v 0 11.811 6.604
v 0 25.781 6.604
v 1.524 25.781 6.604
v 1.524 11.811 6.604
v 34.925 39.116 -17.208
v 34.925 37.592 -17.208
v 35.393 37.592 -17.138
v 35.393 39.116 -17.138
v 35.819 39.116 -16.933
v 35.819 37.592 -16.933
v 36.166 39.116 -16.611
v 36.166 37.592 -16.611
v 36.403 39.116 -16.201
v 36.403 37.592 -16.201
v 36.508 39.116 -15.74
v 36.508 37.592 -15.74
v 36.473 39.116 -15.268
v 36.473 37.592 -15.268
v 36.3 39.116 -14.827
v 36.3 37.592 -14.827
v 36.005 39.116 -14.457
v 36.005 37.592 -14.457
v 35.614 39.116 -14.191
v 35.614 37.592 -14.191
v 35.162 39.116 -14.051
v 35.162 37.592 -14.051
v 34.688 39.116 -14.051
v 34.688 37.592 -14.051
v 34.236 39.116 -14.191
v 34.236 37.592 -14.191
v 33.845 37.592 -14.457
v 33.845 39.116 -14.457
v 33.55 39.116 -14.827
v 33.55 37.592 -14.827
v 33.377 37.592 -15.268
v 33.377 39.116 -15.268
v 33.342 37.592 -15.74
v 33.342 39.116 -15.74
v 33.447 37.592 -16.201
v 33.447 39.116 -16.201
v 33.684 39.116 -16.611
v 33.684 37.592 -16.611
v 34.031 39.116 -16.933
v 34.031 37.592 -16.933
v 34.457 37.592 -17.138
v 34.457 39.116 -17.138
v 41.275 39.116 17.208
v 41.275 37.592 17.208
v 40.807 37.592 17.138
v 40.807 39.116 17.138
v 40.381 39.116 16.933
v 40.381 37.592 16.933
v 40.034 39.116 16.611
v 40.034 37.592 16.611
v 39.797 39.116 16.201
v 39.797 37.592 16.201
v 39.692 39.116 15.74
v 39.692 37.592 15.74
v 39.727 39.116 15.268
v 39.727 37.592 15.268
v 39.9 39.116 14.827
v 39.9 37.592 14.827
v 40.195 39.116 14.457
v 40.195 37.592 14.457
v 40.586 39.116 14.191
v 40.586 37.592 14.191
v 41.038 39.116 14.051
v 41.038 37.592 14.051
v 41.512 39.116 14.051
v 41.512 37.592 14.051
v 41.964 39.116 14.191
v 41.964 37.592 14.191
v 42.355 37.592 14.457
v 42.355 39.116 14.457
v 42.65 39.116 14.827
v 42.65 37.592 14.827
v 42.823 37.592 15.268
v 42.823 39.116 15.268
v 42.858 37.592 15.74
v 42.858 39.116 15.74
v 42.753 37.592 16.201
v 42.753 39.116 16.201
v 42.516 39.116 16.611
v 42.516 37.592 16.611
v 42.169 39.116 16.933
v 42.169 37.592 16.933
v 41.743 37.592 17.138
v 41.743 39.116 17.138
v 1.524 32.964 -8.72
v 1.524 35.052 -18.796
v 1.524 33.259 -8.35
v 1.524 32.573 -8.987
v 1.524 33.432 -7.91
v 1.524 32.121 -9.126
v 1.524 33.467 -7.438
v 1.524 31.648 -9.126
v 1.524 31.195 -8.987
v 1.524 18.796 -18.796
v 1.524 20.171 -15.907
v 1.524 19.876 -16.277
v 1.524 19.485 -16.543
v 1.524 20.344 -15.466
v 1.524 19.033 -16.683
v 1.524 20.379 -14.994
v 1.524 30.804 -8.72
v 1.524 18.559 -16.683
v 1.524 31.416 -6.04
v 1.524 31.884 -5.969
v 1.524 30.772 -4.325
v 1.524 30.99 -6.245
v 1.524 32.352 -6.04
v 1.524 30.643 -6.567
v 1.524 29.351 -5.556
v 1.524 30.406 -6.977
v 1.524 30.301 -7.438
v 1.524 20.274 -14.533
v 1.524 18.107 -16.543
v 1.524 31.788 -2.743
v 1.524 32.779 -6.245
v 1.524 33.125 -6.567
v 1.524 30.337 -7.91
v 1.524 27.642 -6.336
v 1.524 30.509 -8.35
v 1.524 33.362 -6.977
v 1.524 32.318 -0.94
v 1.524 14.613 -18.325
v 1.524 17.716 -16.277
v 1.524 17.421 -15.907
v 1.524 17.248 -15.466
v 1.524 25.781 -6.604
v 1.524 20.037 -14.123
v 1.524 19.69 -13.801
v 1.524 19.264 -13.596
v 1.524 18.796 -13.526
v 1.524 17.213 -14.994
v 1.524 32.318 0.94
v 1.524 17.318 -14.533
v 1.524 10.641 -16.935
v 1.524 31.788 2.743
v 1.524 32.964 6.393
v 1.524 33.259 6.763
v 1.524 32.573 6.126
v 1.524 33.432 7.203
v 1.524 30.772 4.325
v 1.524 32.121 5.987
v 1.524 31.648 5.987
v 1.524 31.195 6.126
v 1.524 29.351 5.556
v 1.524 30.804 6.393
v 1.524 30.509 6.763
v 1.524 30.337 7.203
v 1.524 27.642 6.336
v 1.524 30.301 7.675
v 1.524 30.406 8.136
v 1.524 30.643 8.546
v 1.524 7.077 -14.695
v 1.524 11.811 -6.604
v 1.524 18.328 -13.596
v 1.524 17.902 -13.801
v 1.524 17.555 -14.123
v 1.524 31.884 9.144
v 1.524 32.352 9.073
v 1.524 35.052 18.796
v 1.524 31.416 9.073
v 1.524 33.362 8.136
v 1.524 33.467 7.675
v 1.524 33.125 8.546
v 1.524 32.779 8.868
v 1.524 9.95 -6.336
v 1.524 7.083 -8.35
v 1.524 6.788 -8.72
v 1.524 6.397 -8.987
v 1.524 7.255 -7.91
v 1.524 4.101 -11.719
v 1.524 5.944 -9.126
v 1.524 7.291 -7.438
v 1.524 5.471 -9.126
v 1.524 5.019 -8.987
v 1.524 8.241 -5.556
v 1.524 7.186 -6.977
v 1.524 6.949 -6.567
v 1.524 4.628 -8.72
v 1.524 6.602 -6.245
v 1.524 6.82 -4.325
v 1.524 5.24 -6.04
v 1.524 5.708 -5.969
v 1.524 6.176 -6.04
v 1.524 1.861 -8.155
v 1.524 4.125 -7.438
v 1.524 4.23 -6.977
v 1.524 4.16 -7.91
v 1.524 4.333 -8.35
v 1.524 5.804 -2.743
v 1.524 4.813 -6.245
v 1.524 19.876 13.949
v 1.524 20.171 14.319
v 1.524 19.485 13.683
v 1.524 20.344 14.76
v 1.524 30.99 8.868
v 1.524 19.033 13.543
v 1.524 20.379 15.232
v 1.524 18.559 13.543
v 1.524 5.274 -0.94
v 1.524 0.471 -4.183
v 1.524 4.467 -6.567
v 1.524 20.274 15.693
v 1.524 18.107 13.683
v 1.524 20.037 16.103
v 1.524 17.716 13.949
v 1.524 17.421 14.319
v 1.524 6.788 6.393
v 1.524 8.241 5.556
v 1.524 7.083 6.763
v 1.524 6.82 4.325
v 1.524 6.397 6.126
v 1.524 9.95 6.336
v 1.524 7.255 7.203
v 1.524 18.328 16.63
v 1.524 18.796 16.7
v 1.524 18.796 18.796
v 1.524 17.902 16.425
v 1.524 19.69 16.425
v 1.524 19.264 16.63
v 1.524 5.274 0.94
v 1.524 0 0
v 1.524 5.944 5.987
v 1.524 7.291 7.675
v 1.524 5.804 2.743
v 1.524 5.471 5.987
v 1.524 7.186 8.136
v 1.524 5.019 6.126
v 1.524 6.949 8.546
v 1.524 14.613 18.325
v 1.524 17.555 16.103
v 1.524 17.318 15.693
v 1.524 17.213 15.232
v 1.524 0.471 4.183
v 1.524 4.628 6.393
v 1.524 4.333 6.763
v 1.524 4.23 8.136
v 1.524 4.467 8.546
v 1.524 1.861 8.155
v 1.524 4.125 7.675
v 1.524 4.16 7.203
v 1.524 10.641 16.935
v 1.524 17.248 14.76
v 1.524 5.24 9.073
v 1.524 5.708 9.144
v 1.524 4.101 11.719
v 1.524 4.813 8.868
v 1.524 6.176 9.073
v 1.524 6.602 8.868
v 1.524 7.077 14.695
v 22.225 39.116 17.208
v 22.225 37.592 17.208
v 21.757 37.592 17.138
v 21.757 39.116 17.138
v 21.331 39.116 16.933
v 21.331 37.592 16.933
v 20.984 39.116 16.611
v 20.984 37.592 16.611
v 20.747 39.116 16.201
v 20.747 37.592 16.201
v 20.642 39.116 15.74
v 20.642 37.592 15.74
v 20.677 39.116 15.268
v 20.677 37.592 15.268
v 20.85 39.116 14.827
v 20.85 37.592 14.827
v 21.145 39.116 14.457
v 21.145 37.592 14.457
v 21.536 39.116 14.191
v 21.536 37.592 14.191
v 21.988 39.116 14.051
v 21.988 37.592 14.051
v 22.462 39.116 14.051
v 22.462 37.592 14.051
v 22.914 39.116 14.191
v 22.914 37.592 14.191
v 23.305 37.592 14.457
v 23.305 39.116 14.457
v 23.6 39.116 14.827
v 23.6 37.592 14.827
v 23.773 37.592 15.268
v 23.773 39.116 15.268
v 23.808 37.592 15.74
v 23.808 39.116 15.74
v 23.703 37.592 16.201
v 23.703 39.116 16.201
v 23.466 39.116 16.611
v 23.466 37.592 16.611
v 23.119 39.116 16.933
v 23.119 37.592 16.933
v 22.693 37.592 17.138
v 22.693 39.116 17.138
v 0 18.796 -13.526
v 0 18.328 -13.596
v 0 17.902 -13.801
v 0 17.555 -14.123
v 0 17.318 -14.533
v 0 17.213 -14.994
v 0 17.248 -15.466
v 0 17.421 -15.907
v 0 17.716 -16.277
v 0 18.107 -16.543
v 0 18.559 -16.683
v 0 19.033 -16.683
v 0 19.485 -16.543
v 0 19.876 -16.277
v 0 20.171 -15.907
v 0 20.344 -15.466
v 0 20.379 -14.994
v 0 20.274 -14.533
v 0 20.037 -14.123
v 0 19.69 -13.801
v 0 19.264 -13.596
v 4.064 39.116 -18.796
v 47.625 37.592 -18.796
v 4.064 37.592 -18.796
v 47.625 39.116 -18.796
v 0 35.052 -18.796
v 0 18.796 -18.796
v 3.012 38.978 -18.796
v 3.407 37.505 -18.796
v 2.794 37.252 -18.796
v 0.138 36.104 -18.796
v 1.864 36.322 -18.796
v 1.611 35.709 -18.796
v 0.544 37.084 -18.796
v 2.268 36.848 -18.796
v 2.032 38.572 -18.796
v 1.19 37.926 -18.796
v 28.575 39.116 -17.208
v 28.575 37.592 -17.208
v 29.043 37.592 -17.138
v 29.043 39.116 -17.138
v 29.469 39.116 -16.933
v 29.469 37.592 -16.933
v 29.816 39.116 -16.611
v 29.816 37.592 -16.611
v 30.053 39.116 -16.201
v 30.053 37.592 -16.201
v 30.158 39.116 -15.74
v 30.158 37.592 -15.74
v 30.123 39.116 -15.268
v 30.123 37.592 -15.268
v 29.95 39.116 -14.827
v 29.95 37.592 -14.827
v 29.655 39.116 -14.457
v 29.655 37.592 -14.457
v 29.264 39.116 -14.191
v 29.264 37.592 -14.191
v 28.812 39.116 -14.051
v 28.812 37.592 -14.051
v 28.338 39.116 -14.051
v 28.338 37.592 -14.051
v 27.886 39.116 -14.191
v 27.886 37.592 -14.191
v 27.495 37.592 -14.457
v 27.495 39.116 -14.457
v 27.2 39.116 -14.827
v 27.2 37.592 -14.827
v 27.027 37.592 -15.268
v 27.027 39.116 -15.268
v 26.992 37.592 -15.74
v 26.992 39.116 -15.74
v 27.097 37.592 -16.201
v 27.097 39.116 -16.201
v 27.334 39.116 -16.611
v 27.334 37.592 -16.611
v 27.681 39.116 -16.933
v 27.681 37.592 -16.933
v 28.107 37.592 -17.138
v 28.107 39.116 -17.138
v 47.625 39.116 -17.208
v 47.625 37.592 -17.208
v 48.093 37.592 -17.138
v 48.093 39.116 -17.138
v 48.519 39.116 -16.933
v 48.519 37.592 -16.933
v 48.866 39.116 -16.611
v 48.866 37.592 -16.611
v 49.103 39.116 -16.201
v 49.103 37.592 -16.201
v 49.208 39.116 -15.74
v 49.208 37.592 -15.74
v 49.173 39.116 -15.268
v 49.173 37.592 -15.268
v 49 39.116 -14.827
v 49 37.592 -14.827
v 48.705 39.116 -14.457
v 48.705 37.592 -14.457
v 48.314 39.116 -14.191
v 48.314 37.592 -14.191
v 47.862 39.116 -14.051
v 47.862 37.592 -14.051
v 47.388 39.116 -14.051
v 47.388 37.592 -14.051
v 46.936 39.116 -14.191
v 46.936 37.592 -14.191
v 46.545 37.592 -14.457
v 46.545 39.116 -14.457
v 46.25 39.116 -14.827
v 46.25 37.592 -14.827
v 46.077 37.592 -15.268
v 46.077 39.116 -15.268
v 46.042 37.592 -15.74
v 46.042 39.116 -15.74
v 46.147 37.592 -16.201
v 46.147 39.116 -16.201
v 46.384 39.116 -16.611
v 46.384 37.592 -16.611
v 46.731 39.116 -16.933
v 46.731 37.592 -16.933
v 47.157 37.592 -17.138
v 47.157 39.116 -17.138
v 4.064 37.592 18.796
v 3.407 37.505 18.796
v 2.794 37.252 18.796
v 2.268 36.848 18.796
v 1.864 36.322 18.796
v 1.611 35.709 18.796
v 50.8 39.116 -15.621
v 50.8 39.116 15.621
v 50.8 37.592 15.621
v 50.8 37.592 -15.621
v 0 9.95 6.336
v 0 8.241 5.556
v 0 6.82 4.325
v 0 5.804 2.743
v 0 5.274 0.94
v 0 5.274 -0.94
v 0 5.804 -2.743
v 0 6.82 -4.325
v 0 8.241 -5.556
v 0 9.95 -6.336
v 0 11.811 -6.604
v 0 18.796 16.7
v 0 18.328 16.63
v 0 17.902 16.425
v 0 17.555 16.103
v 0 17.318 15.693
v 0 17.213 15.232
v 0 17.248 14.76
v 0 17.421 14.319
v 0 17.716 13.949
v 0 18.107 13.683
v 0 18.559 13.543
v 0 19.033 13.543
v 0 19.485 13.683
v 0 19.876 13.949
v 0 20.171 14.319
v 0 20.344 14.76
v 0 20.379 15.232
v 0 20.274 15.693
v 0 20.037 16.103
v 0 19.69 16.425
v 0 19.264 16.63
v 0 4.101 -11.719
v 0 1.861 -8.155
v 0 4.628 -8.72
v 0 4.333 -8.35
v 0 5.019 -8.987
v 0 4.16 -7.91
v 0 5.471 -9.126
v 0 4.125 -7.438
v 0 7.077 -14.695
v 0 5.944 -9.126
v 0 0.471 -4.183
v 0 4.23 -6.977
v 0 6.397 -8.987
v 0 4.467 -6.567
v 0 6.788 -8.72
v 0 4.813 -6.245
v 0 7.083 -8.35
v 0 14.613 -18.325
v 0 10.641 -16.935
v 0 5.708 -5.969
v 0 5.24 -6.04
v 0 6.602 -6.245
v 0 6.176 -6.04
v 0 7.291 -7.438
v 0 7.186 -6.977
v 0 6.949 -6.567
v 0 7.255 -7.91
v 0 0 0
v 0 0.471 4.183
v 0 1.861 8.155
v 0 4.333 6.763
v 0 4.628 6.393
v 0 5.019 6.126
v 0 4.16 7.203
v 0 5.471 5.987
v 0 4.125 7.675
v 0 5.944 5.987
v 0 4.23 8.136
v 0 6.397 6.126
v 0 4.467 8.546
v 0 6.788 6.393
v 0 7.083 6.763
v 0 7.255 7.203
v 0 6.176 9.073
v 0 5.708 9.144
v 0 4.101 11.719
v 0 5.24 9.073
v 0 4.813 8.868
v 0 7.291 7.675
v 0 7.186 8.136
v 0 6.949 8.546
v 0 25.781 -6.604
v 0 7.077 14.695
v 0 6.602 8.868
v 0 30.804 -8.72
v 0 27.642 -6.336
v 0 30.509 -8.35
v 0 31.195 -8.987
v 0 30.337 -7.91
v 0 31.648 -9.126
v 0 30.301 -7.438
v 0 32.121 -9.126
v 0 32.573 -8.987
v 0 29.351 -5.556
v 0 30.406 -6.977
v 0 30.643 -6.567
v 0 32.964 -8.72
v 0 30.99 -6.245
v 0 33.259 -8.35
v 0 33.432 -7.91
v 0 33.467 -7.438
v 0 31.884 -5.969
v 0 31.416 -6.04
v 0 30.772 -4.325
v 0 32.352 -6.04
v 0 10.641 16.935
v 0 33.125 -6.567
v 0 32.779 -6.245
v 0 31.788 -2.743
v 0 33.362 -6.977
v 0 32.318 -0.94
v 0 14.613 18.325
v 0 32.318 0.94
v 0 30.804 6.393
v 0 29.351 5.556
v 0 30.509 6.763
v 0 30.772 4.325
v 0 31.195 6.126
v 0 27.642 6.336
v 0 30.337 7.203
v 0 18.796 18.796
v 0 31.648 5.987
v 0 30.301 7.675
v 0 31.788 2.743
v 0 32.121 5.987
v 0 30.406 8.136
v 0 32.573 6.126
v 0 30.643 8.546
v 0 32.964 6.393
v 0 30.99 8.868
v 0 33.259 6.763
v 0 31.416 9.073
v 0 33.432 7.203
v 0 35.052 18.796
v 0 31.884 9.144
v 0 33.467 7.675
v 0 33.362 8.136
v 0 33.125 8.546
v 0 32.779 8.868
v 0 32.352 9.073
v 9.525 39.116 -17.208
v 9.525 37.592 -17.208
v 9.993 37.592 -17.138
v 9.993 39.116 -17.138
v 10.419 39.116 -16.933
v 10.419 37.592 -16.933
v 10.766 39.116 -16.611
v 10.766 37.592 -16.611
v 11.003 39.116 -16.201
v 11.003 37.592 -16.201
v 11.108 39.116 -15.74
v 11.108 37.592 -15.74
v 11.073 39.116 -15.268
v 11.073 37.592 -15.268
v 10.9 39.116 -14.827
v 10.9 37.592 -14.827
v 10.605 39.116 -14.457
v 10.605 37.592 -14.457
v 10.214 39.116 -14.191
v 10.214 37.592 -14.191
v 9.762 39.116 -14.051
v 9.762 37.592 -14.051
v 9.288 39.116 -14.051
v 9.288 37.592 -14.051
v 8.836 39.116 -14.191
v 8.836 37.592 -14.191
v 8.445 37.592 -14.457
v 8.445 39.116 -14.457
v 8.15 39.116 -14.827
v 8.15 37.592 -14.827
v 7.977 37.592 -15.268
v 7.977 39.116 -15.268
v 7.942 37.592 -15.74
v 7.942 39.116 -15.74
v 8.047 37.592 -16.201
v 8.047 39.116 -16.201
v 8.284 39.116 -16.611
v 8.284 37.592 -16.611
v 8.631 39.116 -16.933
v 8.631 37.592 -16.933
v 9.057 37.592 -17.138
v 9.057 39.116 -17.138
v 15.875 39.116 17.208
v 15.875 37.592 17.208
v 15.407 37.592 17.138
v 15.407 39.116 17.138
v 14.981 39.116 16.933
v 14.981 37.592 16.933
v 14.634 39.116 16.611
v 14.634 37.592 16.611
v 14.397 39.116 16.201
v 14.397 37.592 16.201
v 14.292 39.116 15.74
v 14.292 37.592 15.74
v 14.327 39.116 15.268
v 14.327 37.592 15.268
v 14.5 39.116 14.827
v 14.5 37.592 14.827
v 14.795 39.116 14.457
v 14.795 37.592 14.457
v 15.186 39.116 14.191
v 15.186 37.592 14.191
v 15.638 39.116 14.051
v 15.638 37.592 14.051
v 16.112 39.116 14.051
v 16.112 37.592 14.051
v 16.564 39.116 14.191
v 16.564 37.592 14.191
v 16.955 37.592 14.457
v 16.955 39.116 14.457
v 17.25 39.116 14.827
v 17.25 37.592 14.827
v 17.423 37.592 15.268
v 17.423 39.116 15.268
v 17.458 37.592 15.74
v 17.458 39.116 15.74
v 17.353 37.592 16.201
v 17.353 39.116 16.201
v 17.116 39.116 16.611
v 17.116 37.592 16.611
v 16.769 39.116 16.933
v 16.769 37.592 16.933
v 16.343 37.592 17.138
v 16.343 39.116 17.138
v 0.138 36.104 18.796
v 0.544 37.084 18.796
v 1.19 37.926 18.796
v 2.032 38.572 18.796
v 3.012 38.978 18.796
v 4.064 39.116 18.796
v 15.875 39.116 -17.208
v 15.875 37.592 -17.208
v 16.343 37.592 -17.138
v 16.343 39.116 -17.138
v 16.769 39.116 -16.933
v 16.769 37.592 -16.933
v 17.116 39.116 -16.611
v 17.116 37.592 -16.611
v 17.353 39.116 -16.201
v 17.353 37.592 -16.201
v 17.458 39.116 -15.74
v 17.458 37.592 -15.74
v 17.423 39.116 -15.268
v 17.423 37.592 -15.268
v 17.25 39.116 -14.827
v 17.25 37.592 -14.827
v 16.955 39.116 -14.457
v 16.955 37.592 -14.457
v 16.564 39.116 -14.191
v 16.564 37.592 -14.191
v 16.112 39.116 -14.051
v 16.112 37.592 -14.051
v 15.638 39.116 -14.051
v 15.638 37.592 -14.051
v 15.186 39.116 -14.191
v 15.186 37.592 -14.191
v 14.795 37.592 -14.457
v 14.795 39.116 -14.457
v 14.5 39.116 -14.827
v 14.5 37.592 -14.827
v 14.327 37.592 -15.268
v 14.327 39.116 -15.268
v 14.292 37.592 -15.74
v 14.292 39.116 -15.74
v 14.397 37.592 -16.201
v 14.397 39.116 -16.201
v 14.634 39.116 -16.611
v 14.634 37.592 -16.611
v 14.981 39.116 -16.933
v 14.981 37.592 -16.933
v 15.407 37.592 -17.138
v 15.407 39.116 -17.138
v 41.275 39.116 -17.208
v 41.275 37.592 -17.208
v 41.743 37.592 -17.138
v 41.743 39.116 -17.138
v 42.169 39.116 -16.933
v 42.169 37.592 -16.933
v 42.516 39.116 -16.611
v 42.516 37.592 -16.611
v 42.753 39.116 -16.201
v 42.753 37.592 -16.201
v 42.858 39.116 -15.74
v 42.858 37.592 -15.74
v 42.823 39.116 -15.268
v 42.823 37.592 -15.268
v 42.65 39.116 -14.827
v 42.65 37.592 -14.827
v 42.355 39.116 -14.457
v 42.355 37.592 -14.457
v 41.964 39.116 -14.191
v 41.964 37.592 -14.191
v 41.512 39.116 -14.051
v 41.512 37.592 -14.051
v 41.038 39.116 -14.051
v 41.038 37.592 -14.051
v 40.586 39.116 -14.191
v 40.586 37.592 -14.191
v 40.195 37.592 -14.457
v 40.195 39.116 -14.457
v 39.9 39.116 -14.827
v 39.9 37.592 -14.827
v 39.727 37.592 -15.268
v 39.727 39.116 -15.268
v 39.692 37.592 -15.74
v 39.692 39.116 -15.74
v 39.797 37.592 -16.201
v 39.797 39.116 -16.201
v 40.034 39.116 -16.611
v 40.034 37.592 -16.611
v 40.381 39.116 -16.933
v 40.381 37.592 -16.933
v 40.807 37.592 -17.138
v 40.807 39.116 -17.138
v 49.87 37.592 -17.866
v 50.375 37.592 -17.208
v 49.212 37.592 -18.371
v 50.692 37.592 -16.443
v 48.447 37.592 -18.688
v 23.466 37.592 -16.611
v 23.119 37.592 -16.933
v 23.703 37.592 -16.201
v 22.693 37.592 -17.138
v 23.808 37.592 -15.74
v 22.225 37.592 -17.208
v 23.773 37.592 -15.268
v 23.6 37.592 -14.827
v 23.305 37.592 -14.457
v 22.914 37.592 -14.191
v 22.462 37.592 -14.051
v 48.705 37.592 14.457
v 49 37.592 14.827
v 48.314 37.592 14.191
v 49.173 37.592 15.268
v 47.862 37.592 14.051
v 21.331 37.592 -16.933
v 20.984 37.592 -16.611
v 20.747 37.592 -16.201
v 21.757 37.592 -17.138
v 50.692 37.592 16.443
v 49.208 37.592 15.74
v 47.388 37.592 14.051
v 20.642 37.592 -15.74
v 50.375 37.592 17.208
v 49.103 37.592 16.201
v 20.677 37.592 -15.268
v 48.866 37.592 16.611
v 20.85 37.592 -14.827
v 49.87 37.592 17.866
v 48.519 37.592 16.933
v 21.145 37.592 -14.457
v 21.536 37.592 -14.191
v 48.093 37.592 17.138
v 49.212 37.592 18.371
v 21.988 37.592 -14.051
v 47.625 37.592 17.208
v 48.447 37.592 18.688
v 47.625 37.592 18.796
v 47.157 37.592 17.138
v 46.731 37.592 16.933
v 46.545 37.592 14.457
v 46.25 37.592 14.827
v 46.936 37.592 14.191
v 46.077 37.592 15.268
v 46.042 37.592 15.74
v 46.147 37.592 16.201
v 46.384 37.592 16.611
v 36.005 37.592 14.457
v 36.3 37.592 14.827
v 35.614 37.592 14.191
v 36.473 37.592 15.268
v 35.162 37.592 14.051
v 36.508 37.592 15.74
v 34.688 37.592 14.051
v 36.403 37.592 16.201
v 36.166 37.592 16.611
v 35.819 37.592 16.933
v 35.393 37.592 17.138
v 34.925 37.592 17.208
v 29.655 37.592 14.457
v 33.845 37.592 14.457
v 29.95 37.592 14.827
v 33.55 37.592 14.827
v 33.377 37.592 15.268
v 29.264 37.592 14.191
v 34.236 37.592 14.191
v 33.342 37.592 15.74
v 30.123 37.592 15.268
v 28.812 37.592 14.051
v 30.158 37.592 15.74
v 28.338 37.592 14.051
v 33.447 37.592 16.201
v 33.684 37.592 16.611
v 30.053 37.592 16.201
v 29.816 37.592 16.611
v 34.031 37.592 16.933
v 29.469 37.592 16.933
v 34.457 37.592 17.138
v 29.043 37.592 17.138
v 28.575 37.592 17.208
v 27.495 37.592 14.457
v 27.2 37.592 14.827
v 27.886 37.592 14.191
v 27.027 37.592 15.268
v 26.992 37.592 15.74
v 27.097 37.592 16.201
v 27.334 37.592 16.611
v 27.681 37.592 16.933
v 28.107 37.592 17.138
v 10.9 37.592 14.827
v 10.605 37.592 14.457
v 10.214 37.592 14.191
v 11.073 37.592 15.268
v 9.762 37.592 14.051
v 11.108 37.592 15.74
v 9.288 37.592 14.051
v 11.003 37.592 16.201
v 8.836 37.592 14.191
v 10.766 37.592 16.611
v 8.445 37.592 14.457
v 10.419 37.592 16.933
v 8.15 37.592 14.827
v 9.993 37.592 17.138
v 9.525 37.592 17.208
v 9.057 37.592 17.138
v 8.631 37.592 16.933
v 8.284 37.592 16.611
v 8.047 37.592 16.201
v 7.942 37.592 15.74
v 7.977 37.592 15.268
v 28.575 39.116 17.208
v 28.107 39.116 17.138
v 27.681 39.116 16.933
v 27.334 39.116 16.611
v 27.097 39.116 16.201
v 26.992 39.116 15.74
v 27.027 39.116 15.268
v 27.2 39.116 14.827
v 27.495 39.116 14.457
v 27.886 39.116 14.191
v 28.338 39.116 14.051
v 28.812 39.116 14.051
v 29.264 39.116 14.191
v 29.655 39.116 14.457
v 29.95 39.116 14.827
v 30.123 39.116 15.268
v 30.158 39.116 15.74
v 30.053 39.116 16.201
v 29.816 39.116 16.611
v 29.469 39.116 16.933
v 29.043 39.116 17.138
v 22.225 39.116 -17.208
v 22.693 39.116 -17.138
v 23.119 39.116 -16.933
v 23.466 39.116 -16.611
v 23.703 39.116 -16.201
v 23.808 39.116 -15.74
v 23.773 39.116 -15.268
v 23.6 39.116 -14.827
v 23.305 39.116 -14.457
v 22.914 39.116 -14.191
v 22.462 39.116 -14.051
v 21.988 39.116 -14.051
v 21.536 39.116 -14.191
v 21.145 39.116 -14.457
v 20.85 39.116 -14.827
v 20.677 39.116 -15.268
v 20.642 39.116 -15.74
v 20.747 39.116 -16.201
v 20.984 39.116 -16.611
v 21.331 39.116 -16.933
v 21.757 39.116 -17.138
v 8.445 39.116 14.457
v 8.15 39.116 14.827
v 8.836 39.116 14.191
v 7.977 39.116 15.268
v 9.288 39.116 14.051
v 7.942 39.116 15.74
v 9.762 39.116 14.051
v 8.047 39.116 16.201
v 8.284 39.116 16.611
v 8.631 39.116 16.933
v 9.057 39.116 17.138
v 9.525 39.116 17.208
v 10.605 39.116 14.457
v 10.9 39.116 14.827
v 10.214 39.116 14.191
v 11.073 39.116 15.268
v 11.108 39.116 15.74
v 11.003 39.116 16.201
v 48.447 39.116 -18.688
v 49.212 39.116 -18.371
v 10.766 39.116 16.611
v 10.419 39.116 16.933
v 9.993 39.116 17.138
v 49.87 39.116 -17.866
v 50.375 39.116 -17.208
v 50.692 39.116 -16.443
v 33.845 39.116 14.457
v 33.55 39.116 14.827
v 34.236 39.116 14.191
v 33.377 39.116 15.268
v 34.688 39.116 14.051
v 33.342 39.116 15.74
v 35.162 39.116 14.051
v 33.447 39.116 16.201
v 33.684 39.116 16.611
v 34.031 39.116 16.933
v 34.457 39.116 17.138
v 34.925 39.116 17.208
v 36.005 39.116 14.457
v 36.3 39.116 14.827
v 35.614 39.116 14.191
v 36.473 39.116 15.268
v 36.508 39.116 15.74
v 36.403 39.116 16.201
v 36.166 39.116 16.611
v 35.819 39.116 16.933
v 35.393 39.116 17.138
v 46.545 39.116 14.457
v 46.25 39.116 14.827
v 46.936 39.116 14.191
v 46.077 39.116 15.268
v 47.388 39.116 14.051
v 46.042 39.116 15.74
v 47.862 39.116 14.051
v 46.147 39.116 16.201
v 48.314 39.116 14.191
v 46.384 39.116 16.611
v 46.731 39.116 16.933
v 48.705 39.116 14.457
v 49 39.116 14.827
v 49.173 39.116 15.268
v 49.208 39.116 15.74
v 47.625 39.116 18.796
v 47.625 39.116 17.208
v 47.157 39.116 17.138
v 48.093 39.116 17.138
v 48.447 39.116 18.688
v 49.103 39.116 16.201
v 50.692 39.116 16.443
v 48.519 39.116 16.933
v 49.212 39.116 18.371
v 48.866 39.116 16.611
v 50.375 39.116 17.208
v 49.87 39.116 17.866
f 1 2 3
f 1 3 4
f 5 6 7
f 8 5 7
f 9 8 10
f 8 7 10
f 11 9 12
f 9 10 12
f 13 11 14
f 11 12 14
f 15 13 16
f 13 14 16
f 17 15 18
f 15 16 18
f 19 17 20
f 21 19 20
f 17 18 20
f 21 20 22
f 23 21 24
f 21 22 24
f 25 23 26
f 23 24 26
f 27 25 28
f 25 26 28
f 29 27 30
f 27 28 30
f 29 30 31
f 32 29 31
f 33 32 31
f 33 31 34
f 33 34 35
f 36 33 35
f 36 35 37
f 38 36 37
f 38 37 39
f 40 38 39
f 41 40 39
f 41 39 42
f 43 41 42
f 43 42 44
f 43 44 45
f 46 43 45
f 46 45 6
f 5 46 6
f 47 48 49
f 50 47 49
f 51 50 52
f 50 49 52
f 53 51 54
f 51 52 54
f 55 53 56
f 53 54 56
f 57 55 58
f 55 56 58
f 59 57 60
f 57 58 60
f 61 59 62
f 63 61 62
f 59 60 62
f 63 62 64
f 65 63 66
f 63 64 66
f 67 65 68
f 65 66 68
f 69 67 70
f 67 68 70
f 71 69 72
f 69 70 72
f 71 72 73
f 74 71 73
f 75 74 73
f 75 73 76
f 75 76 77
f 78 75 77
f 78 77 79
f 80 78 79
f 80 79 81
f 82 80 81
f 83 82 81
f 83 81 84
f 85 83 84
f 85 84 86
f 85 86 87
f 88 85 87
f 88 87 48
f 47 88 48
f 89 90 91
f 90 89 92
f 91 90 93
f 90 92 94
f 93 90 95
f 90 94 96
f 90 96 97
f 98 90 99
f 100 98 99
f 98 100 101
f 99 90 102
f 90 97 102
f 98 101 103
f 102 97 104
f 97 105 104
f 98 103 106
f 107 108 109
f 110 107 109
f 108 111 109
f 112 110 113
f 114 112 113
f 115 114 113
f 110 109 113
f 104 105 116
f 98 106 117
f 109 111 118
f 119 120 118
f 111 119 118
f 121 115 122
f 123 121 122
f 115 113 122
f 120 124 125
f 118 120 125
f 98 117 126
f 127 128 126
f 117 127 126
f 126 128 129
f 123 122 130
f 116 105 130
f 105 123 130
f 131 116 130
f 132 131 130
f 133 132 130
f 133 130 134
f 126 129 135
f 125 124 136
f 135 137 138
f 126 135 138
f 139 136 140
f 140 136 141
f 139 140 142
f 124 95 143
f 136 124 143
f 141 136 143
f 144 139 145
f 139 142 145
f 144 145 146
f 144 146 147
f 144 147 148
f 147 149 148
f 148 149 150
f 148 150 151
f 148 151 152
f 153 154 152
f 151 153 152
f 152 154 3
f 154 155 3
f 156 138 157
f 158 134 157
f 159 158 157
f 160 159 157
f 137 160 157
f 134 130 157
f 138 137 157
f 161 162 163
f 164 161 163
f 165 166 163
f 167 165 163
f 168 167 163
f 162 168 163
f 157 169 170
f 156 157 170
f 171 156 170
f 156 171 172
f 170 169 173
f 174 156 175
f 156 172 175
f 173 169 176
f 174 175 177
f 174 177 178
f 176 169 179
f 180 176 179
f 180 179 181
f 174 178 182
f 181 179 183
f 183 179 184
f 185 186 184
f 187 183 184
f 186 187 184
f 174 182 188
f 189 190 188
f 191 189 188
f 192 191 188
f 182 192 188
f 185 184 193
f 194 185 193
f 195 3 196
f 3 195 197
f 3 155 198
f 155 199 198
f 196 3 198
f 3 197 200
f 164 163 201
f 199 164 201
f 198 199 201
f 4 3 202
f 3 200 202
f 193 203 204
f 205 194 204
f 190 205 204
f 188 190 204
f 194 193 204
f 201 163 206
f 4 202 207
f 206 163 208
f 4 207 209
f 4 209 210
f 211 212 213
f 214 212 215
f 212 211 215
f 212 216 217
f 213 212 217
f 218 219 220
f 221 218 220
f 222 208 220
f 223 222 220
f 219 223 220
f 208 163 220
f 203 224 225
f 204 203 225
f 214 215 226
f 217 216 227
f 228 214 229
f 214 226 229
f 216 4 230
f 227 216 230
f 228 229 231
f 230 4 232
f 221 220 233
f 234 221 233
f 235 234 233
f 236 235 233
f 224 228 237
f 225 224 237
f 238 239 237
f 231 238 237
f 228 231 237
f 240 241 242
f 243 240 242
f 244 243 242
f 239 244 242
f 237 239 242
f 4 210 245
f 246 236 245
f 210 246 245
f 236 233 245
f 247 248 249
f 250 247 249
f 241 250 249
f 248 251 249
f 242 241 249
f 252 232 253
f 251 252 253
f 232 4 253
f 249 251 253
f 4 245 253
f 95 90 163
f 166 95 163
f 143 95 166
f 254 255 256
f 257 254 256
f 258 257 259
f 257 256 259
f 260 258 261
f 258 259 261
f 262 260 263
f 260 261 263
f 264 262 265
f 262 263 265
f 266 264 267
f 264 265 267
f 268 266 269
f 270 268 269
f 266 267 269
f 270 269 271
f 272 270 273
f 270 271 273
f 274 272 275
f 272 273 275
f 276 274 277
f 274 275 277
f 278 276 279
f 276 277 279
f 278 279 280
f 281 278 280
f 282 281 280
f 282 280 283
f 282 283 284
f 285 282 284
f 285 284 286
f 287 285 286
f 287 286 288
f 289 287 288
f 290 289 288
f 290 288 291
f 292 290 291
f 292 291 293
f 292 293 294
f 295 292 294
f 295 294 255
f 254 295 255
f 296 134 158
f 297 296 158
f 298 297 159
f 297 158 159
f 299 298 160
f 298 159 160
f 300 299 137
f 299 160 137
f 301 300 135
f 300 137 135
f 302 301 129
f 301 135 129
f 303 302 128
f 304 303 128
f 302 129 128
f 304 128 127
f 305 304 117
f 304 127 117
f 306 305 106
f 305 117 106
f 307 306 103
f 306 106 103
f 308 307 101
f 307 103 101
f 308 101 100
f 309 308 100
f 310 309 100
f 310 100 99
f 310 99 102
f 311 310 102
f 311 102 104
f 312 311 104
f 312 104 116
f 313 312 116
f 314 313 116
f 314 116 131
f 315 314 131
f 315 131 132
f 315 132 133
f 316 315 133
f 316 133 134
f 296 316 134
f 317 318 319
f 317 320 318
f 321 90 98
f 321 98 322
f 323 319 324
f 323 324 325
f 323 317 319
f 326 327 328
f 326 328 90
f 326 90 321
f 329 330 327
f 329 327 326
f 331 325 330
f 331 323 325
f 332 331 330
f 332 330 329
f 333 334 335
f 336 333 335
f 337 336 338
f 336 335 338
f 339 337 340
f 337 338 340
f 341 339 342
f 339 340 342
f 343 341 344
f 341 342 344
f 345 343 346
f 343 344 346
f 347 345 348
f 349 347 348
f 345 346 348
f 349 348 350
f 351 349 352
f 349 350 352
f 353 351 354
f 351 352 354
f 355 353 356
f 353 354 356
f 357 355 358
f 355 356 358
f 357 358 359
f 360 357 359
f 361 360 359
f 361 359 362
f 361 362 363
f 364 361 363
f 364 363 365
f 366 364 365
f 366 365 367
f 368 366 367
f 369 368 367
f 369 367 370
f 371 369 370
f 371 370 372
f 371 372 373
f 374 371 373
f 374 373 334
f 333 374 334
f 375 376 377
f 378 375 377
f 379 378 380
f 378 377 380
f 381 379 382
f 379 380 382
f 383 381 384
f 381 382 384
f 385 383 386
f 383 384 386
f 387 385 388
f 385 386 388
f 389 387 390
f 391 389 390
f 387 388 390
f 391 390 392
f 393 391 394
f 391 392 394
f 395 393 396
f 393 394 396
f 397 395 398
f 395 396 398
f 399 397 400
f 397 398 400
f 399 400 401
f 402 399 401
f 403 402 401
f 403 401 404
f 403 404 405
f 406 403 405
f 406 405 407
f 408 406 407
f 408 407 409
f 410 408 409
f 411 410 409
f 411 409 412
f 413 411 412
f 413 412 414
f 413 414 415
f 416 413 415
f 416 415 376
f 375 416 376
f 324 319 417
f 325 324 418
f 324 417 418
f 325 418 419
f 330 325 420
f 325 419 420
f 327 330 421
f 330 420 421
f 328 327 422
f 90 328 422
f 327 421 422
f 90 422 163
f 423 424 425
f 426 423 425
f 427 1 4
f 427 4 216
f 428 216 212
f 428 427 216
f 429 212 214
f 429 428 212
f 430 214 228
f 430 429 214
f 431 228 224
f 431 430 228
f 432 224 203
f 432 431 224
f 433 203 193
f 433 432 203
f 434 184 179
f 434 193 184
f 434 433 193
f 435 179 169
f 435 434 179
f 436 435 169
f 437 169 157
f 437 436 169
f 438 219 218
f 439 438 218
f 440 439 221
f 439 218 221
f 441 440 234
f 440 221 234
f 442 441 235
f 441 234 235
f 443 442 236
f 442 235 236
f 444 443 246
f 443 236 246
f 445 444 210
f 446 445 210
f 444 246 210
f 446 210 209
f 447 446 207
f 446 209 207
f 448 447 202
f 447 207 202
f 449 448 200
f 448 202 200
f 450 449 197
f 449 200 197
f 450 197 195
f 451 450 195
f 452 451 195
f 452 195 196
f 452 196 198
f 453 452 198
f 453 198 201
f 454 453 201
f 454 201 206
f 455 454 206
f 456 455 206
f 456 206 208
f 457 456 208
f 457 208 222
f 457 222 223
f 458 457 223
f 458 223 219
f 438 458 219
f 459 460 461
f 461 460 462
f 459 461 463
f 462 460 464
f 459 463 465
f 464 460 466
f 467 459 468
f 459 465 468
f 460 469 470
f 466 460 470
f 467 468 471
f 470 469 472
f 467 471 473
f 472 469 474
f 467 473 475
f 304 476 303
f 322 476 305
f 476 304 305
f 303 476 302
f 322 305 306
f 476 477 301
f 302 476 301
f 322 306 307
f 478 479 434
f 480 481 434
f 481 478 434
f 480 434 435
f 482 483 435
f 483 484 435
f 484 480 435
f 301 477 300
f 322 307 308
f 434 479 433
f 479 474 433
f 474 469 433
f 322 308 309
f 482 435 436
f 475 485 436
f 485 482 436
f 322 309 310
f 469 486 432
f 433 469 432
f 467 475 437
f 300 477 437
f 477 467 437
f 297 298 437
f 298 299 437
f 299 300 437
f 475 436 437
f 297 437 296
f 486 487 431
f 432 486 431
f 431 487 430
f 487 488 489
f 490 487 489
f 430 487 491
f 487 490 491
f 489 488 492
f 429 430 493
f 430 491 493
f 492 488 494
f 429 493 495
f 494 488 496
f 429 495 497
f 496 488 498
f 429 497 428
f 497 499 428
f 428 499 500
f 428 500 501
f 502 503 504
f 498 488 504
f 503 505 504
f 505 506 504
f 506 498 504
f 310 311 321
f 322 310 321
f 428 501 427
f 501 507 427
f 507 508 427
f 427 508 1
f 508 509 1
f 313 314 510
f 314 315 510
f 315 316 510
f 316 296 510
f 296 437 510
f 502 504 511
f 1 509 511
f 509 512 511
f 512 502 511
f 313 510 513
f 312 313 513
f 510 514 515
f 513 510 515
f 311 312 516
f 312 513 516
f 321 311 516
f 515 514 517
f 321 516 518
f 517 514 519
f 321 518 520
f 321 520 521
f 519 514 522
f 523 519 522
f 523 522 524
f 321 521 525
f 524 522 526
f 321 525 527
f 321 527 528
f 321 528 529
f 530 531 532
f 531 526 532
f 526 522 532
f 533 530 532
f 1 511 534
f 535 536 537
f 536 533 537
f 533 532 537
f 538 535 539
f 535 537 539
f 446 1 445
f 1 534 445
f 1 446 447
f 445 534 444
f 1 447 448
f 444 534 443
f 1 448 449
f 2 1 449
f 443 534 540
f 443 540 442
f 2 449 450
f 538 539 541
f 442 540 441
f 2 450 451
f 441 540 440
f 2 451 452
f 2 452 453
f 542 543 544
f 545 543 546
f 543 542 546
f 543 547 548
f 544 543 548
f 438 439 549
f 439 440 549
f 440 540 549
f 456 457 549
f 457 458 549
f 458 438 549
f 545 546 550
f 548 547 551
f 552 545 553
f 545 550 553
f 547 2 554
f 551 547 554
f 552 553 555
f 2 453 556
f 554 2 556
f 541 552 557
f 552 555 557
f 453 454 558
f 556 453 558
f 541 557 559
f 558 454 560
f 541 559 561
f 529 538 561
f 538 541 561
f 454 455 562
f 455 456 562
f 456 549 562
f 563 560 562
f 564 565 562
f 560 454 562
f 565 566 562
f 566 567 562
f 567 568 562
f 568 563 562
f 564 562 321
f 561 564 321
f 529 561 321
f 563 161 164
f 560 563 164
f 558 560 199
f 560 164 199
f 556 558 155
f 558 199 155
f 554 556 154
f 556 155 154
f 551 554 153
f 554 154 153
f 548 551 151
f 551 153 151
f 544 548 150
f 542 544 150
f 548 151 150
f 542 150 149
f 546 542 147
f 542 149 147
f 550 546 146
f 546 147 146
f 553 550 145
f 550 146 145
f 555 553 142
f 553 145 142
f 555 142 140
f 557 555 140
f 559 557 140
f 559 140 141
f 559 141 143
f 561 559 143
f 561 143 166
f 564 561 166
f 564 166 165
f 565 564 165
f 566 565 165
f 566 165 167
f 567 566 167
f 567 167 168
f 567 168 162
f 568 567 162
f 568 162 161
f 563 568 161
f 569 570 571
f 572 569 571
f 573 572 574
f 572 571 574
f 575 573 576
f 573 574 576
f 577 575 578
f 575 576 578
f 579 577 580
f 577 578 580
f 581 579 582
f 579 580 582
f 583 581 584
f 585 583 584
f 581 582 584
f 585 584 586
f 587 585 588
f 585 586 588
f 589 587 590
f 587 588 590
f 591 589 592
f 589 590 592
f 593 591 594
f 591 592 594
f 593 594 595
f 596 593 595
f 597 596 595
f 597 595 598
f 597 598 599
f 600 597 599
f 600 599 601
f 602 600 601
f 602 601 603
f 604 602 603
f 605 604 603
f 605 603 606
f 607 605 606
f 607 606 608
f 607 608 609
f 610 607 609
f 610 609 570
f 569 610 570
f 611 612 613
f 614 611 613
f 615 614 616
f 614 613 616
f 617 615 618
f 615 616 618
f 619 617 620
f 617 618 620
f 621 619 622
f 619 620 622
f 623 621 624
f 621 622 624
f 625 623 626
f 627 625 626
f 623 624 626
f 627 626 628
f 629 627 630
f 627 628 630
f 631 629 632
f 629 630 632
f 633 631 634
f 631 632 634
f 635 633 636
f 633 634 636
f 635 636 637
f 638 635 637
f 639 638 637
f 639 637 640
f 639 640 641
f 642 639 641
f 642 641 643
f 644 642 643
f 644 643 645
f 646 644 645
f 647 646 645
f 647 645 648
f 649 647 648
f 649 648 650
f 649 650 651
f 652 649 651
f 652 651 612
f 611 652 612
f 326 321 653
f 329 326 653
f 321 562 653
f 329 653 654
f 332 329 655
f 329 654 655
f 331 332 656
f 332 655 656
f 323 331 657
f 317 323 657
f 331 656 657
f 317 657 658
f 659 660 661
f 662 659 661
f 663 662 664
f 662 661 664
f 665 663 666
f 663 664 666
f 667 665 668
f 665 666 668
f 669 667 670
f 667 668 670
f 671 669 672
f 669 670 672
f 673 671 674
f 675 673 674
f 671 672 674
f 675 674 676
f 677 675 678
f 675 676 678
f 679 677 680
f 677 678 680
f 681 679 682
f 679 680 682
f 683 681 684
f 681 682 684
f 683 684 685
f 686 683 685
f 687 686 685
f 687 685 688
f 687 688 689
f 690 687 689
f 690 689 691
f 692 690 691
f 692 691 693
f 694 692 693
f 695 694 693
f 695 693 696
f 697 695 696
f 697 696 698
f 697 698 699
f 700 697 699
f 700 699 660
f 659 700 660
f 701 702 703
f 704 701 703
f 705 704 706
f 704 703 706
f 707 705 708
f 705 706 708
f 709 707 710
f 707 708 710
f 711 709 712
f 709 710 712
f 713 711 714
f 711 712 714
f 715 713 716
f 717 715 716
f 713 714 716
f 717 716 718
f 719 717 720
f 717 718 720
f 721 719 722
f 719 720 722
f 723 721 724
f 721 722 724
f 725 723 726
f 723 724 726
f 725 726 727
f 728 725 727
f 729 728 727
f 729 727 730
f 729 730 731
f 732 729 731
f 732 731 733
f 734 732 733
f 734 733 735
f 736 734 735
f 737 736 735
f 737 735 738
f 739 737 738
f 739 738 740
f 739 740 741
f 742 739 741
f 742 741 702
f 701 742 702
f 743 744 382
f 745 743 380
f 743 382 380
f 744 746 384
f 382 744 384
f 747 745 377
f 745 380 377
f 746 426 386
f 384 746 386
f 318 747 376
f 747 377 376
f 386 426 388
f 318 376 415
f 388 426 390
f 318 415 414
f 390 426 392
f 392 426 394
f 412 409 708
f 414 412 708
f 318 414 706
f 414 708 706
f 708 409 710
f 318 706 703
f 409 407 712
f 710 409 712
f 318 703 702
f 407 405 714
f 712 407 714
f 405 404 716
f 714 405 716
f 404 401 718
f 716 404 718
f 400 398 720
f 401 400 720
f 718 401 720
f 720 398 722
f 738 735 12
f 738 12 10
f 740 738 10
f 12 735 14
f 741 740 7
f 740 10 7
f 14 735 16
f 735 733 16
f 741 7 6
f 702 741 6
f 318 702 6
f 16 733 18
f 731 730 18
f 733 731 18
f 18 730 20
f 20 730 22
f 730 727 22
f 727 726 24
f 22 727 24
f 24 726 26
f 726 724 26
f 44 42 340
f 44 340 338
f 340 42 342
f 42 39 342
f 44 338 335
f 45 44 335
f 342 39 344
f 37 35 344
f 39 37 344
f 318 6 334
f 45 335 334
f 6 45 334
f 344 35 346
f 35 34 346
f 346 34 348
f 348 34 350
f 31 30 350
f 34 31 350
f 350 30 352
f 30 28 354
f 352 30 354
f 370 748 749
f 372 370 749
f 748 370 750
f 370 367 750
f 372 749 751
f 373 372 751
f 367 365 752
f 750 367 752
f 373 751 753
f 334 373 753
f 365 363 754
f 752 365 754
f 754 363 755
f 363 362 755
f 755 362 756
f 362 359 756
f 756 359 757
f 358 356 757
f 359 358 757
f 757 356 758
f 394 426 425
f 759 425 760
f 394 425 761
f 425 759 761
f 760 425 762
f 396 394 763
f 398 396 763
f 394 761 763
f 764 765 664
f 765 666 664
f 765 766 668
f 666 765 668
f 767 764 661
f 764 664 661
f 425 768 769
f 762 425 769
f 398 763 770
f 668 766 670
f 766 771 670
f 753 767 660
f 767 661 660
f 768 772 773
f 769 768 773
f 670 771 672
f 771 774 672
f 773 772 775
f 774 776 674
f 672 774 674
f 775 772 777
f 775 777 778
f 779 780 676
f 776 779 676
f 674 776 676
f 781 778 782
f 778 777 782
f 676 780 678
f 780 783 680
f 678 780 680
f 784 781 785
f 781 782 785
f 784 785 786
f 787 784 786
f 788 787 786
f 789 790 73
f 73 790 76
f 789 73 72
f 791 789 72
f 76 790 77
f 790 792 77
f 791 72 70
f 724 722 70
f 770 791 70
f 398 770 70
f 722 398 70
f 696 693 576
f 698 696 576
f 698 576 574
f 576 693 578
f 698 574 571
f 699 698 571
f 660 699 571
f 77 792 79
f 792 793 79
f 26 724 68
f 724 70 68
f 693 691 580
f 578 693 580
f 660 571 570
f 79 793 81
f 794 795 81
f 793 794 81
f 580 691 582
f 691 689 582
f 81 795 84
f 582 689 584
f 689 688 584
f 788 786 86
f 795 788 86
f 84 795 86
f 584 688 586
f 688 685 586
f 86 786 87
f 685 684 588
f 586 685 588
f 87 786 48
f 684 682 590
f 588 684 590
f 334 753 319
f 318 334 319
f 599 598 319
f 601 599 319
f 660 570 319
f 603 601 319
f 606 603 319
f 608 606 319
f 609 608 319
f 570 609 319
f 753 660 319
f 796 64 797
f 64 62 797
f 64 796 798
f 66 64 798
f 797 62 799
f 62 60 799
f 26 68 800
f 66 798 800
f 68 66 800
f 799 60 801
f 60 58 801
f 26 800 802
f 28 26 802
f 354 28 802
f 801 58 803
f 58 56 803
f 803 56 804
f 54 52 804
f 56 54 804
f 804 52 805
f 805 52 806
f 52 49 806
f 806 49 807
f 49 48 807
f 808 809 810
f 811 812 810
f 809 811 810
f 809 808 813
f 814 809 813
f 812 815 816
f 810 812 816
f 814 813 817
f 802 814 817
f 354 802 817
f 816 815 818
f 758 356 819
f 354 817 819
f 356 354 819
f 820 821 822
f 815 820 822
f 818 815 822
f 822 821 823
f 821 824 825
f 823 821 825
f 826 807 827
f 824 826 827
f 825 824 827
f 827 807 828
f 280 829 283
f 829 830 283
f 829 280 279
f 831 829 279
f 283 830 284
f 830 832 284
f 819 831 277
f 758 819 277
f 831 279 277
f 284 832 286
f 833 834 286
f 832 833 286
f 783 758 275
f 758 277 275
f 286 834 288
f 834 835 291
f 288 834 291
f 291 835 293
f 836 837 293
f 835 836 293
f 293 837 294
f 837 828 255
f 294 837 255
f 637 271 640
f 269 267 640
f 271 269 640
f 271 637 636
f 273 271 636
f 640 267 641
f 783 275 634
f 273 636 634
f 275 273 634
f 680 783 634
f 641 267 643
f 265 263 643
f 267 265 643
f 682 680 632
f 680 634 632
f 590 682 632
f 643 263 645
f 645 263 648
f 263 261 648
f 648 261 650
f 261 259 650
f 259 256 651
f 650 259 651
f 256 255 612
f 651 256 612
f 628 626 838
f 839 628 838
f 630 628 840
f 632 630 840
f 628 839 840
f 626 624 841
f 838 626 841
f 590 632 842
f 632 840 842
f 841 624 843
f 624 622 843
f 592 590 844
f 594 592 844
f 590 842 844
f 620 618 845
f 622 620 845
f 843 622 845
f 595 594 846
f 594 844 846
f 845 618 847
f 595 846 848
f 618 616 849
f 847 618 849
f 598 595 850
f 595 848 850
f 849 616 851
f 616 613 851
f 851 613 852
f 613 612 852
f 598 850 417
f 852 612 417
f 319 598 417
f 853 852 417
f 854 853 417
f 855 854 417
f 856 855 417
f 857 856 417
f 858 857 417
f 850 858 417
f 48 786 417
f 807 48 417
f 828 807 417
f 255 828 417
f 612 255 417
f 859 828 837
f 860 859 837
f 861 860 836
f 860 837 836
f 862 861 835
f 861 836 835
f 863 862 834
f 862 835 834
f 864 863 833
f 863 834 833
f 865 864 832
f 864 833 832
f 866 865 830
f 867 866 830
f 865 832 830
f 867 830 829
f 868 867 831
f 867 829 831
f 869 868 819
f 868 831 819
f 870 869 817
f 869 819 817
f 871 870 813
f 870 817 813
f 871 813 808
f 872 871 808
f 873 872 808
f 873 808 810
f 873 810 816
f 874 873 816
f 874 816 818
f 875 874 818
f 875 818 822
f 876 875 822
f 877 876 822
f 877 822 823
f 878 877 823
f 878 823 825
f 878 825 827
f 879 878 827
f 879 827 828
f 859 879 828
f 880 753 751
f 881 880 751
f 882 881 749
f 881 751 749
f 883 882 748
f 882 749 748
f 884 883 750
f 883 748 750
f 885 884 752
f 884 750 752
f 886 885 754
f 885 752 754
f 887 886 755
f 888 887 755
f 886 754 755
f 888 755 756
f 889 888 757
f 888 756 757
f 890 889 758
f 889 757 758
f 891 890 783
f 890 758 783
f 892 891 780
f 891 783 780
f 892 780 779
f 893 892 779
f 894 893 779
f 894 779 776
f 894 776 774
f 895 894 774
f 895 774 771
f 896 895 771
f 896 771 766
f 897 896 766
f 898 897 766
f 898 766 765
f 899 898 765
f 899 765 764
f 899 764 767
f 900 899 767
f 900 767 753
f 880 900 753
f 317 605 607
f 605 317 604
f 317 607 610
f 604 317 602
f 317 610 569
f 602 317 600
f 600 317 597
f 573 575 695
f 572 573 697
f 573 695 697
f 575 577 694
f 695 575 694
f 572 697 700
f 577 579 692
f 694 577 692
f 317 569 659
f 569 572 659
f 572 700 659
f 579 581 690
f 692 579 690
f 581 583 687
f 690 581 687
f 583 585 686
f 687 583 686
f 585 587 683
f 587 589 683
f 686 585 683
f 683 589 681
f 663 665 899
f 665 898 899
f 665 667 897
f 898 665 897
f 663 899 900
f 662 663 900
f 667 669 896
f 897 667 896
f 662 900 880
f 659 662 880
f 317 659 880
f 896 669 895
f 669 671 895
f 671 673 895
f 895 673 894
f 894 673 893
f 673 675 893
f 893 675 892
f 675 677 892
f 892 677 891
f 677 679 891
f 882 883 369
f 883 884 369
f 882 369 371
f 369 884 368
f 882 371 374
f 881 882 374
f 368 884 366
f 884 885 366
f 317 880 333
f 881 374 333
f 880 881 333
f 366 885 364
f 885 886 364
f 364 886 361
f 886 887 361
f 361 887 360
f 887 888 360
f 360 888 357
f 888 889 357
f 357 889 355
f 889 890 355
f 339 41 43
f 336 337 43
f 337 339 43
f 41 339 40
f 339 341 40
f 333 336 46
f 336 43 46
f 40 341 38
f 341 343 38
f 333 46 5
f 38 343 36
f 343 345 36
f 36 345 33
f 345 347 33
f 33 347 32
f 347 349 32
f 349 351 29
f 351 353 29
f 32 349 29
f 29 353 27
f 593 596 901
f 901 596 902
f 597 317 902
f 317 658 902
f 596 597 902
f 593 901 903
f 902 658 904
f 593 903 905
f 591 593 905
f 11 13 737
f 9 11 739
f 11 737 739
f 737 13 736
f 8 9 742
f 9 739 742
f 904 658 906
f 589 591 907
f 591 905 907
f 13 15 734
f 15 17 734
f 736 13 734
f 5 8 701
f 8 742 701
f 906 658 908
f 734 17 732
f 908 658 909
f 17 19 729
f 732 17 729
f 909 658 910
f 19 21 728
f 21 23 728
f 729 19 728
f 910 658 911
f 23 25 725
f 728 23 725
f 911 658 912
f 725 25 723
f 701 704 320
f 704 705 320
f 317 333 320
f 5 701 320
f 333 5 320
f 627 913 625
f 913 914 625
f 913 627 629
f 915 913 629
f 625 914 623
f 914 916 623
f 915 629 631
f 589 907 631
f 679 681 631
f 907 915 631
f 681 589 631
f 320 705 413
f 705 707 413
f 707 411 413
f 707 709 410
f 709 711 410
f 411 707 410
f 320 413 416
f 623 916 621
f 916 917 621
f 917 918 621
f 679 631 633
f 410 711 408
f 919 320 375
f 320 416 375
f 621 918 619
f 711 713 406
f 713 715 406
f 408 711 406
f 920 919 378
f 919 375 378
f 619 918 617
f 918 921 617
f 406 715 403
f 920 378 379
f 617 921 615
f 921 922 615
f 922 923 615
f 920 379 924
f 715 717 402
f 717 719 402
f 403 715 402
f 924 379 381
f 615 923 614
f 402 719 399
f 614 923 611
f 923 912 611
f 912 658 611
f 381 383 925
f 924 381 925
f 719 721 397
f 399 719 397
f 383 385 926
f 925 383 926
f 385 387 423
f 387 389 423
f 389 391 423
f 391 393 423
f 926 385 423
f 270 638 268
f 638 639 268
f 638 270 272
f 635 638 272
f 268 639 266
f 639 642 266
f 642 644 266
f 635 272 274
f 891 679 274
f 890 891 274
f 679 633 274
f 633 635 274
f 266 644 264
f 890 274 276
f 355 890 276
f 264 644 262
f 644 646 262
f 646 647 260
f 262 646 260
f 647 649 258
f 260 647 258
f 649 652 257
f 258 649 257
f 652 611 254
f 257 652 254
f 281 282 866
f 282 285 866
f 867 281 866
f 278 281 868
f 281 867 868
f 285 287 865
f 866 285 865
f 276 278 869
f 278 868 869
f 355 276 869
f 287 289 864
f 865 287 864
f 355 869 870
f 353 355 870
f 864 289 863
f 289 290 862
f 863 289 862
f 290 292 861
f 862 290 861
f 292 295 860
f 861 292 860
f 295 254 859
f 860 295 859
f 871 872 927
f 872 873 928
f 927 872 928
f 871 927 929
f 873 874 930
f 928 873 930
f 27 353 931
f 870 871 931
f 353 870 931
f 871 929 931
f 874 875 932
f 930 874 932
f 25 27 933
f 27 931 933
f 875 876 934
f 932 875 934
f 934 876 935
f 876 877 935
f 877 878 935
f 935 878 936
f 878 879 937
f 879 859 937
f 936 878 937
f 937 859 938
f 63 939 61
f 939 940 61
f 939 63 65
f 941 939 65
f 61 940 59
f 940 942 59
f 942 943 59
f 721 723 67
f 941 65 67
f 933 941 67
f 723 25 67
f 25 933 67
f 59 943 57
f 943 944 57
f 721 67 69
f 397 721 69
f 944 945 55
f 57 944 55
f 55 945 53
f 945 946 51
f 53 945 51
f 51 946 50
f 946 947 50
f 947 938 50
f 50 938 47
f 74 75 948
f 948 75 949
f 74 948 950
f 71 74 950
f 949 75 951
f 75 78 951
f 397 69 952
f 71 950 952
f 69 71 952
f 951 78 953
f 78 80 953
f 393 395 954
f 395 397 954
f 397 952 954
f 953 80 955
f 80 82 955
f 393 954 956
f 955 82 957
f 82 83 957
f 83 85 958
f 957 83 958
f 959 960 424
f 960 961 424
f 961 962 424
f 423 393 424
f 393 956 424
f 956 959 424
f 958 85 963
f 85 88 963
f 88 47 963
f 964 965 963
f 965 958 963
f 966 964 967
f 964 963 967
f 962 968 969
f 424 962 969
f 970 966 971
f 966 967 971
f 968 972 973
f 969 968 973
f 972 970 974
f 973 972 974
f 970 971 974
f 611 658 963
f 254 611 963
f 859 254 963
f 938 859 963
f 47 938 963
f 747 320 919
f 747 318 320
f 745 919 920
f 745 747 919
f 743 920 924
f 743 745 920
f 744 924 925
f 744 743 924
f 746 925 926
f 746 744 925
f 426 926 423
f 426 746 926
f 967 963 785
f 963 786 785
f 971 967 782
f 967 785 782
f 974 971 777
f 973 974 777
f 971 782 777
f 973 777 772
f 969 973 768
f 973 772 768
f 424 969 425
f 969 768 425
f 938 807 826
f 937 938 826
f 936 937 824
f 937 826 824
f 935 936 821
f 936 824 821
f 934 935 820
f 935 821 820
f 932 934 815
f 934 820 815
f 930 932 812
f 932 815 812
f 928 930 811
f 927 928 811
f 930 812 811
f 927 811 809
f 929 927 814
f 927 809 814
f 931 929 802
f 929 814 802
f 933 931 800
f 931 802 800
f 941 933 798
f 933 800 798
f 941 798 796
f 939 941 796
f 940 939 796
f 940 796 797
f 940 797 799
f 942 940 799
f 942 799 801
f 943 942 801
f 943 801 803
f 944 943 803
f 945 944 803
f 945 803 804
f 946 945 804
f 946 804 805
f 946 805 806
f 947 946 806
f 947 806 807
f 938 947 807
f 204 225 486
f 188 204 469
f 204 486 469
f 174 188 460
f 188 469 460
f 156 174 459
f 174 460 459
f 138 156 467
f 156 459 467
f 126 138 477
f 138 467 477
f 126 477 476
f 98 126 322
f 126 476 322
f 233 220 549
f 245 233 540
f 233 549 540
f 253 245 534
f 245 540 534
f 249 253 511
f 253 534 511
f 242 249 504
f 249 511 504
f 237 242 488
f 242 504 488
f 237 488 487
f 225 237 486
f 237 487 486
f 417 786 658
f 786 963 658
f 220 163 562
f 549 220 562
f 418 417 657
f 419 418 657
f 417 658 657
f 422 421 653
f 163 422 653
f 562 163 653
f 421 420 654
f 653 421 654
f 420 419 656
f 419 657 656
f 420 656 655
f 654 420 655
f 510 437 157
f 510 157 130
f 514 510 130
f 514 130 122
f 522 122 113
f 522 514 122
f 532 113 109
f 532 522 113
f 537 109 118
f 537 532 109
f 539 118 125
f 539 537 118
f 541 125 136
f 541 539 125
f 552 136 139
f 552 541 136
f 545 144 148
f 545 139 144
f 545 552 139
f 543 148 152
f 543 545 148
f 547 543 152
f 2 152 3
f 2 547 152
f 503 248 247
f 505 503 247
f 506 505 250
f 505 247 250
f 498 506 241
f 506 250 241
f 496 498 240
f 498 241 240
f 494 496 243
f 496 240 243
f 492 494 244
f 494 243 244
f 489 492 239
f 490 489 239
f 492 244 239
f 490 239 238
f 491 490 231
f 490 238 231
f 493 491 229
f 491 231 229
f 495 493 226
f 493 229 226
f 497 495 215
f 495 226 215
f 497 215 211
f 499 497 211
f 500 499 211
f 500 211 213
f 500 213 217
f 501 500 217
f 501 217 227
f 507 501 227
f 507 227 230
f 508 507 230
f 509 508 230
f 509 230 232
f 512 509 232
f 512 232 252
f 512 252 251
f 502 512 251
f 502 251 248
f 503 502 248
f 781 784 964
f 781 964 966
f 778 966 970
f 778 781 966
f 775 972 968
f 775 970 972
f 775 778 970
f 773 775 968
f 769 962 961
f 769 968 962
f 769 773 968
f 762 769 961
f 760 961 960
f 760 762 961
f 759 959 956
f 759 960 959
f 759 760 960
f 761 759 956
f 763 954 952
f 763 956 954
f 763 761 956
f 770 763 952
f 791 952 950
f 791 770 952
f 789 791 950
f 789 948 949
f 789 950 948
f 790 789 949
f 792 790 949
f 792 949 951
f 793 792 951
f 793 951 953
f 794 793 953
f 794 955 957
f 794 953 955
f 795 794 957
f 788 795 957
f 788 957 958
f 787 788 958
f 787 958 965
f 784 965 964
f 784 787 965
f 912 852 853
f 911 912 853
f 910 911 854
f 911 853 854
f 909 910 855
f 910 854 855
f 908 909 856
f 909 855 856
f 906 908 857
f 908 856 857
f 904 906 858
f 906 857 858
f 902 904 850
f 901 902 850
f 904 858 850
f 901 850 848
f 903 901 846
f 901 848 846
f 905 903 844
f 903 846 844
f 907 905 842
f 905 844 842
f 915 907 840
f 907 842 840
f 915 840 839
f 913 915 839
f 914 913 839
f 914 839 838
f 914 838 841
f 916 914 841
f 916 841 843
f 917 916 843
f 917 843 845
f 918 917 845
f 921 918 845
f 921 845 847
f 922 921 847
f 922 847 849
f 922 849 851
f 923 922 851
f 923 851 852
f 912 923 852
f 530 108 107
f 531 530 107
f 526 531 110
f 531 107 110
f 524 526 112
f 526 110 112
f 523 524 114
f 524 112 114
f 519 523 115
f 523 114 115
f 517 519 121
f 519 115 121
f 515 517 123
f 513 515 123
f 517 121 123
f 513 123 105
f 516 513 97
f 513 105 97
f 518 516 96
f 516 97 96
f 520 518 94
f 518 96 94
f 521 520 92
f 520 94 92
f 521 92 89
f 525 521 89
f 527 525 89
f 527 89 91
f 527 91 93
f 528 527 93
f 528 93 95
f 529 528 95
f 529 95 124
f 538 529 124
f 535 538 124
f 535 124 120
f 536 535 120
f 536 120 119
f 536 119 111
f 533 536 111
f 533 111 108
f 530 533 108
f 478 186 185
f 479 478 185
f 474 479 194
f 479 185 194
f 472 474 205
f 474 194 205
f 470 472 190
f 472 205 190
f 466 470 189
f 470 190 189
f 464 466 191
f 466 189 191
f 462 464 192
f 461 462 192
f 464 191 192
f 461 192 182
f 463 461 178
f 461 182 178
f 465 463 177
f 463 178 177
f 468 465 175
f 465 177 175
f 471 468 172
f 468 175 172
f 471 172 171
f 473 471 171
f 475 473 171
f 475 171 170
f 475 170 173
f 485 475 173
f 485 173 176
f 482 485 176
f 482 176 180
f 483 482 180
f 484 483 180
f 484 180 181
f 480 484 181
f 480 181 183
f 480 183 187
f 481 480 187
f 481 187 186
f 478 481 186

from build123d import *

# Parameters (mm, degrees)
BOSS_EXTRUDE1_DEPTH          = 18.796
CUT_EXTRUDE1_DEPTH           = 67.813105541
CUT_EXTRUDE2_DEPTH           = 67.813105541
F_1_8_0_125_DIAMETER_HOLE2_D = 3.175
FILLET1_R                    = 3.175
F_1_8_0_125_DIAMETER_HOLE1_D = 3.175
LPATTERN1_COUNT              = 7
LPATTERN1_PITCH              = 6.35
MIRROR1_COPY_1_D             = 3.175
MIRROR1_COPY_2_D             = 3.175
MIRROR1_COPY_3_D             = 3.175
MIRROR1_COPY_4_D             = 3.175
MIRROR1_COPY_5_D             = 3.175
MIRROR1_COPY_6_D             = 3.175


with BuildPart() as part:
    # Sketch1 → Boss-Extrude1 (new, symmetric)
    with BuildSketch(Plane.XY):
        with BuildLine():
            Line((0, 0), (0, 35.052))
            ThreePointArc((0, 35.052), (1.190318041, 37.925681959), (4.064, 39.116))
            Line((4.064, 39.116), (50.8, 39.116))
            Line((50.8, 39.116), (50.8, 37.592))
            Line((50.8, 37.592), (4.064, 37.592))
            ThreePointArc((4.064, 37.592), (2.267948776, 36.848051224), (1.524, 35.052))
            Line((1.524, 35.052), (1.524, 0))
            Line((1.524, 0), (0, 0))
        make_face()
    extrude(amount=BOSS_EXTRUDE1_DEPTH, both=True)

    # Sketch2 → Cut-Extrude1 (cut, through all)
    with BuildSketch(Plane.ZY):
        with BuildLine():
            ThreePointArc((0, 0), (-13.290779059, 5.505220941), (-18.796, 18.796))
            Line((-18.796, 18.796), (-18.796, 0))
            Line((-18.796, 0), (0, 0))
        make_face()
        with BuildLine():
            ThreePointArc((18.796, 18.796), (13.290779059, 5.505220941), (0, 0))
            Line((0, 0), (18.796, 0))
            Line((18.796, 0), (18.796, 18.796))
        make_face()
    extrude(amount=-CUT_EXTRUDE1_DEPTH, mode=Mode.SUBTRACT)

    # Sketch3 → Cut-Extrude2 (cut, through all)
    with BuildSketch(Plane.ZY):
        with BuildLine():
            Line((-6.604, 11.811), (-6.604, 25.781))
            ThreePointArc((-6.604, 25.781), (0, 32.385), (6.604, 25.781))
            Line((6.604, 25.781), (6.604, 11.811))
            ThreePointArc((6.604, 11.811), (0, 5.207), (-6.604, 11.811))
        make_face()
    extrude(amount=-CUT_EXTRUDE2_DEPTH, mode=Mode.SUBTRACT)

    # 1/8 (0.125) Diameter Hole2 (through all)
    with Locations(Plane(origin=(0, 31.884241927, -7.5565), x_dir=(0, 0, -1), z_dir=(-1, 0, 0))):
        with Locations((0, 0), (-15.113, 0), (-22.6695, 13.088241927), (-15.113, 26.176483854), (0, 26.176483854), (7.5565, 13.088241927)):
            Hole(F_1_8_0_125_DIAMETER_HOLE2_D / 2)

    # Fillet1
    fillet1_edges = [part.edges().sort_by_distance(p)[0] for p in [
        (50.8, 38.354, 18.796),
        (50.8, 38.354, -18.796),
    ]]
    fillet(fillet1_edges, radius=FILLET1_R)

    # 1/8 (0.125) Diameter Hole1 (through all)
    with Locations(Plane(origin=(47.625, 39.116, -15.621), x_dir=(0, 0, 1), z_dir=(0, 1, 0))):
        with Locations((0, 0)):
            f_1_8_0_125_diameter_hole1 = Hole(F_1_8_0_125_DIAMETER_HOLE1_D / 2)

    # LPattern1: 1/8 (0.125) Diameter Hole1 ×7
    with Locations(*[(-i * LPATTERN1_PITCH, 0, 0) for i in range(1, LPATTERN1_COUNT)]):
        add(f_1_8_0_125_diameter_hole1, mode=Mode.SUBTRACT)

    # Mirror1: 1/8 (0.125) Diameter Hole1 across plane
    add(f_1_8_0_125_diameter_hole1.mirror(Plane.XY), mode=Mode.SUBTRACT)

    # Mirror1 copy 1 (through all)
    with Locations(Plane(origin=(41.275, 39.116, 15.621), x_dir=(0, 0, -1), z_dir=(0, 1, 0))):
        with Locations((0, 0)):
            Hole(MIRROR1_COPY_1_D / 2)

    # Mirror1 copy 2 (through all)
    with Locations(Plane(origin=(34.925, 39.116, 15.621), x_dir=(0, 0, -1), z_dir=(0, 1, 0))):
        with Locations((0, 0)):
            Hole(MIRROR1_COPY_2_D / 2)

    # Mirror1 copy 3 (through all)
    with Locations(Plane(origin=(28.575, 39.116, 15.621), x_dir=(0, 0, -1), z_dir=(0, 1, 0))):
        with Locations((0, 0)):
            Hole(MIRROR1_COPY_3_D / 2)

    # Mirror1 copy 4 (through all)
    with Locations(Plane(origin=(22.225, 39.116, 15.621), x_dir=(0, 0, -1), z_dir=(0, 1, 0))):
        with Locations((0, 0)):
            Hole(MIRROR1_COPY_4_D / 2)

    # Mirror1 copy 5 (through all)
    with Locations(Plane(origin=(15.875, 39.116, 15.621), x_dir=(0, 0, -1), z_dir=(0, 1, 0))):
        with Locations((0, 0)):
            Hole(MIRROR1_COPY_5_D / 2)

    # Mirror1 copy 6 (through all)
    with Locations(Plane(origin=(9.525, 39.116, 15.621), x_dir=(0, 0, -1), z_dir=(0, 1, 0))):
        with Locations((0, 0)):
            Hole(MIRROR1_COPY_6_D / 2)


solid = part.part
